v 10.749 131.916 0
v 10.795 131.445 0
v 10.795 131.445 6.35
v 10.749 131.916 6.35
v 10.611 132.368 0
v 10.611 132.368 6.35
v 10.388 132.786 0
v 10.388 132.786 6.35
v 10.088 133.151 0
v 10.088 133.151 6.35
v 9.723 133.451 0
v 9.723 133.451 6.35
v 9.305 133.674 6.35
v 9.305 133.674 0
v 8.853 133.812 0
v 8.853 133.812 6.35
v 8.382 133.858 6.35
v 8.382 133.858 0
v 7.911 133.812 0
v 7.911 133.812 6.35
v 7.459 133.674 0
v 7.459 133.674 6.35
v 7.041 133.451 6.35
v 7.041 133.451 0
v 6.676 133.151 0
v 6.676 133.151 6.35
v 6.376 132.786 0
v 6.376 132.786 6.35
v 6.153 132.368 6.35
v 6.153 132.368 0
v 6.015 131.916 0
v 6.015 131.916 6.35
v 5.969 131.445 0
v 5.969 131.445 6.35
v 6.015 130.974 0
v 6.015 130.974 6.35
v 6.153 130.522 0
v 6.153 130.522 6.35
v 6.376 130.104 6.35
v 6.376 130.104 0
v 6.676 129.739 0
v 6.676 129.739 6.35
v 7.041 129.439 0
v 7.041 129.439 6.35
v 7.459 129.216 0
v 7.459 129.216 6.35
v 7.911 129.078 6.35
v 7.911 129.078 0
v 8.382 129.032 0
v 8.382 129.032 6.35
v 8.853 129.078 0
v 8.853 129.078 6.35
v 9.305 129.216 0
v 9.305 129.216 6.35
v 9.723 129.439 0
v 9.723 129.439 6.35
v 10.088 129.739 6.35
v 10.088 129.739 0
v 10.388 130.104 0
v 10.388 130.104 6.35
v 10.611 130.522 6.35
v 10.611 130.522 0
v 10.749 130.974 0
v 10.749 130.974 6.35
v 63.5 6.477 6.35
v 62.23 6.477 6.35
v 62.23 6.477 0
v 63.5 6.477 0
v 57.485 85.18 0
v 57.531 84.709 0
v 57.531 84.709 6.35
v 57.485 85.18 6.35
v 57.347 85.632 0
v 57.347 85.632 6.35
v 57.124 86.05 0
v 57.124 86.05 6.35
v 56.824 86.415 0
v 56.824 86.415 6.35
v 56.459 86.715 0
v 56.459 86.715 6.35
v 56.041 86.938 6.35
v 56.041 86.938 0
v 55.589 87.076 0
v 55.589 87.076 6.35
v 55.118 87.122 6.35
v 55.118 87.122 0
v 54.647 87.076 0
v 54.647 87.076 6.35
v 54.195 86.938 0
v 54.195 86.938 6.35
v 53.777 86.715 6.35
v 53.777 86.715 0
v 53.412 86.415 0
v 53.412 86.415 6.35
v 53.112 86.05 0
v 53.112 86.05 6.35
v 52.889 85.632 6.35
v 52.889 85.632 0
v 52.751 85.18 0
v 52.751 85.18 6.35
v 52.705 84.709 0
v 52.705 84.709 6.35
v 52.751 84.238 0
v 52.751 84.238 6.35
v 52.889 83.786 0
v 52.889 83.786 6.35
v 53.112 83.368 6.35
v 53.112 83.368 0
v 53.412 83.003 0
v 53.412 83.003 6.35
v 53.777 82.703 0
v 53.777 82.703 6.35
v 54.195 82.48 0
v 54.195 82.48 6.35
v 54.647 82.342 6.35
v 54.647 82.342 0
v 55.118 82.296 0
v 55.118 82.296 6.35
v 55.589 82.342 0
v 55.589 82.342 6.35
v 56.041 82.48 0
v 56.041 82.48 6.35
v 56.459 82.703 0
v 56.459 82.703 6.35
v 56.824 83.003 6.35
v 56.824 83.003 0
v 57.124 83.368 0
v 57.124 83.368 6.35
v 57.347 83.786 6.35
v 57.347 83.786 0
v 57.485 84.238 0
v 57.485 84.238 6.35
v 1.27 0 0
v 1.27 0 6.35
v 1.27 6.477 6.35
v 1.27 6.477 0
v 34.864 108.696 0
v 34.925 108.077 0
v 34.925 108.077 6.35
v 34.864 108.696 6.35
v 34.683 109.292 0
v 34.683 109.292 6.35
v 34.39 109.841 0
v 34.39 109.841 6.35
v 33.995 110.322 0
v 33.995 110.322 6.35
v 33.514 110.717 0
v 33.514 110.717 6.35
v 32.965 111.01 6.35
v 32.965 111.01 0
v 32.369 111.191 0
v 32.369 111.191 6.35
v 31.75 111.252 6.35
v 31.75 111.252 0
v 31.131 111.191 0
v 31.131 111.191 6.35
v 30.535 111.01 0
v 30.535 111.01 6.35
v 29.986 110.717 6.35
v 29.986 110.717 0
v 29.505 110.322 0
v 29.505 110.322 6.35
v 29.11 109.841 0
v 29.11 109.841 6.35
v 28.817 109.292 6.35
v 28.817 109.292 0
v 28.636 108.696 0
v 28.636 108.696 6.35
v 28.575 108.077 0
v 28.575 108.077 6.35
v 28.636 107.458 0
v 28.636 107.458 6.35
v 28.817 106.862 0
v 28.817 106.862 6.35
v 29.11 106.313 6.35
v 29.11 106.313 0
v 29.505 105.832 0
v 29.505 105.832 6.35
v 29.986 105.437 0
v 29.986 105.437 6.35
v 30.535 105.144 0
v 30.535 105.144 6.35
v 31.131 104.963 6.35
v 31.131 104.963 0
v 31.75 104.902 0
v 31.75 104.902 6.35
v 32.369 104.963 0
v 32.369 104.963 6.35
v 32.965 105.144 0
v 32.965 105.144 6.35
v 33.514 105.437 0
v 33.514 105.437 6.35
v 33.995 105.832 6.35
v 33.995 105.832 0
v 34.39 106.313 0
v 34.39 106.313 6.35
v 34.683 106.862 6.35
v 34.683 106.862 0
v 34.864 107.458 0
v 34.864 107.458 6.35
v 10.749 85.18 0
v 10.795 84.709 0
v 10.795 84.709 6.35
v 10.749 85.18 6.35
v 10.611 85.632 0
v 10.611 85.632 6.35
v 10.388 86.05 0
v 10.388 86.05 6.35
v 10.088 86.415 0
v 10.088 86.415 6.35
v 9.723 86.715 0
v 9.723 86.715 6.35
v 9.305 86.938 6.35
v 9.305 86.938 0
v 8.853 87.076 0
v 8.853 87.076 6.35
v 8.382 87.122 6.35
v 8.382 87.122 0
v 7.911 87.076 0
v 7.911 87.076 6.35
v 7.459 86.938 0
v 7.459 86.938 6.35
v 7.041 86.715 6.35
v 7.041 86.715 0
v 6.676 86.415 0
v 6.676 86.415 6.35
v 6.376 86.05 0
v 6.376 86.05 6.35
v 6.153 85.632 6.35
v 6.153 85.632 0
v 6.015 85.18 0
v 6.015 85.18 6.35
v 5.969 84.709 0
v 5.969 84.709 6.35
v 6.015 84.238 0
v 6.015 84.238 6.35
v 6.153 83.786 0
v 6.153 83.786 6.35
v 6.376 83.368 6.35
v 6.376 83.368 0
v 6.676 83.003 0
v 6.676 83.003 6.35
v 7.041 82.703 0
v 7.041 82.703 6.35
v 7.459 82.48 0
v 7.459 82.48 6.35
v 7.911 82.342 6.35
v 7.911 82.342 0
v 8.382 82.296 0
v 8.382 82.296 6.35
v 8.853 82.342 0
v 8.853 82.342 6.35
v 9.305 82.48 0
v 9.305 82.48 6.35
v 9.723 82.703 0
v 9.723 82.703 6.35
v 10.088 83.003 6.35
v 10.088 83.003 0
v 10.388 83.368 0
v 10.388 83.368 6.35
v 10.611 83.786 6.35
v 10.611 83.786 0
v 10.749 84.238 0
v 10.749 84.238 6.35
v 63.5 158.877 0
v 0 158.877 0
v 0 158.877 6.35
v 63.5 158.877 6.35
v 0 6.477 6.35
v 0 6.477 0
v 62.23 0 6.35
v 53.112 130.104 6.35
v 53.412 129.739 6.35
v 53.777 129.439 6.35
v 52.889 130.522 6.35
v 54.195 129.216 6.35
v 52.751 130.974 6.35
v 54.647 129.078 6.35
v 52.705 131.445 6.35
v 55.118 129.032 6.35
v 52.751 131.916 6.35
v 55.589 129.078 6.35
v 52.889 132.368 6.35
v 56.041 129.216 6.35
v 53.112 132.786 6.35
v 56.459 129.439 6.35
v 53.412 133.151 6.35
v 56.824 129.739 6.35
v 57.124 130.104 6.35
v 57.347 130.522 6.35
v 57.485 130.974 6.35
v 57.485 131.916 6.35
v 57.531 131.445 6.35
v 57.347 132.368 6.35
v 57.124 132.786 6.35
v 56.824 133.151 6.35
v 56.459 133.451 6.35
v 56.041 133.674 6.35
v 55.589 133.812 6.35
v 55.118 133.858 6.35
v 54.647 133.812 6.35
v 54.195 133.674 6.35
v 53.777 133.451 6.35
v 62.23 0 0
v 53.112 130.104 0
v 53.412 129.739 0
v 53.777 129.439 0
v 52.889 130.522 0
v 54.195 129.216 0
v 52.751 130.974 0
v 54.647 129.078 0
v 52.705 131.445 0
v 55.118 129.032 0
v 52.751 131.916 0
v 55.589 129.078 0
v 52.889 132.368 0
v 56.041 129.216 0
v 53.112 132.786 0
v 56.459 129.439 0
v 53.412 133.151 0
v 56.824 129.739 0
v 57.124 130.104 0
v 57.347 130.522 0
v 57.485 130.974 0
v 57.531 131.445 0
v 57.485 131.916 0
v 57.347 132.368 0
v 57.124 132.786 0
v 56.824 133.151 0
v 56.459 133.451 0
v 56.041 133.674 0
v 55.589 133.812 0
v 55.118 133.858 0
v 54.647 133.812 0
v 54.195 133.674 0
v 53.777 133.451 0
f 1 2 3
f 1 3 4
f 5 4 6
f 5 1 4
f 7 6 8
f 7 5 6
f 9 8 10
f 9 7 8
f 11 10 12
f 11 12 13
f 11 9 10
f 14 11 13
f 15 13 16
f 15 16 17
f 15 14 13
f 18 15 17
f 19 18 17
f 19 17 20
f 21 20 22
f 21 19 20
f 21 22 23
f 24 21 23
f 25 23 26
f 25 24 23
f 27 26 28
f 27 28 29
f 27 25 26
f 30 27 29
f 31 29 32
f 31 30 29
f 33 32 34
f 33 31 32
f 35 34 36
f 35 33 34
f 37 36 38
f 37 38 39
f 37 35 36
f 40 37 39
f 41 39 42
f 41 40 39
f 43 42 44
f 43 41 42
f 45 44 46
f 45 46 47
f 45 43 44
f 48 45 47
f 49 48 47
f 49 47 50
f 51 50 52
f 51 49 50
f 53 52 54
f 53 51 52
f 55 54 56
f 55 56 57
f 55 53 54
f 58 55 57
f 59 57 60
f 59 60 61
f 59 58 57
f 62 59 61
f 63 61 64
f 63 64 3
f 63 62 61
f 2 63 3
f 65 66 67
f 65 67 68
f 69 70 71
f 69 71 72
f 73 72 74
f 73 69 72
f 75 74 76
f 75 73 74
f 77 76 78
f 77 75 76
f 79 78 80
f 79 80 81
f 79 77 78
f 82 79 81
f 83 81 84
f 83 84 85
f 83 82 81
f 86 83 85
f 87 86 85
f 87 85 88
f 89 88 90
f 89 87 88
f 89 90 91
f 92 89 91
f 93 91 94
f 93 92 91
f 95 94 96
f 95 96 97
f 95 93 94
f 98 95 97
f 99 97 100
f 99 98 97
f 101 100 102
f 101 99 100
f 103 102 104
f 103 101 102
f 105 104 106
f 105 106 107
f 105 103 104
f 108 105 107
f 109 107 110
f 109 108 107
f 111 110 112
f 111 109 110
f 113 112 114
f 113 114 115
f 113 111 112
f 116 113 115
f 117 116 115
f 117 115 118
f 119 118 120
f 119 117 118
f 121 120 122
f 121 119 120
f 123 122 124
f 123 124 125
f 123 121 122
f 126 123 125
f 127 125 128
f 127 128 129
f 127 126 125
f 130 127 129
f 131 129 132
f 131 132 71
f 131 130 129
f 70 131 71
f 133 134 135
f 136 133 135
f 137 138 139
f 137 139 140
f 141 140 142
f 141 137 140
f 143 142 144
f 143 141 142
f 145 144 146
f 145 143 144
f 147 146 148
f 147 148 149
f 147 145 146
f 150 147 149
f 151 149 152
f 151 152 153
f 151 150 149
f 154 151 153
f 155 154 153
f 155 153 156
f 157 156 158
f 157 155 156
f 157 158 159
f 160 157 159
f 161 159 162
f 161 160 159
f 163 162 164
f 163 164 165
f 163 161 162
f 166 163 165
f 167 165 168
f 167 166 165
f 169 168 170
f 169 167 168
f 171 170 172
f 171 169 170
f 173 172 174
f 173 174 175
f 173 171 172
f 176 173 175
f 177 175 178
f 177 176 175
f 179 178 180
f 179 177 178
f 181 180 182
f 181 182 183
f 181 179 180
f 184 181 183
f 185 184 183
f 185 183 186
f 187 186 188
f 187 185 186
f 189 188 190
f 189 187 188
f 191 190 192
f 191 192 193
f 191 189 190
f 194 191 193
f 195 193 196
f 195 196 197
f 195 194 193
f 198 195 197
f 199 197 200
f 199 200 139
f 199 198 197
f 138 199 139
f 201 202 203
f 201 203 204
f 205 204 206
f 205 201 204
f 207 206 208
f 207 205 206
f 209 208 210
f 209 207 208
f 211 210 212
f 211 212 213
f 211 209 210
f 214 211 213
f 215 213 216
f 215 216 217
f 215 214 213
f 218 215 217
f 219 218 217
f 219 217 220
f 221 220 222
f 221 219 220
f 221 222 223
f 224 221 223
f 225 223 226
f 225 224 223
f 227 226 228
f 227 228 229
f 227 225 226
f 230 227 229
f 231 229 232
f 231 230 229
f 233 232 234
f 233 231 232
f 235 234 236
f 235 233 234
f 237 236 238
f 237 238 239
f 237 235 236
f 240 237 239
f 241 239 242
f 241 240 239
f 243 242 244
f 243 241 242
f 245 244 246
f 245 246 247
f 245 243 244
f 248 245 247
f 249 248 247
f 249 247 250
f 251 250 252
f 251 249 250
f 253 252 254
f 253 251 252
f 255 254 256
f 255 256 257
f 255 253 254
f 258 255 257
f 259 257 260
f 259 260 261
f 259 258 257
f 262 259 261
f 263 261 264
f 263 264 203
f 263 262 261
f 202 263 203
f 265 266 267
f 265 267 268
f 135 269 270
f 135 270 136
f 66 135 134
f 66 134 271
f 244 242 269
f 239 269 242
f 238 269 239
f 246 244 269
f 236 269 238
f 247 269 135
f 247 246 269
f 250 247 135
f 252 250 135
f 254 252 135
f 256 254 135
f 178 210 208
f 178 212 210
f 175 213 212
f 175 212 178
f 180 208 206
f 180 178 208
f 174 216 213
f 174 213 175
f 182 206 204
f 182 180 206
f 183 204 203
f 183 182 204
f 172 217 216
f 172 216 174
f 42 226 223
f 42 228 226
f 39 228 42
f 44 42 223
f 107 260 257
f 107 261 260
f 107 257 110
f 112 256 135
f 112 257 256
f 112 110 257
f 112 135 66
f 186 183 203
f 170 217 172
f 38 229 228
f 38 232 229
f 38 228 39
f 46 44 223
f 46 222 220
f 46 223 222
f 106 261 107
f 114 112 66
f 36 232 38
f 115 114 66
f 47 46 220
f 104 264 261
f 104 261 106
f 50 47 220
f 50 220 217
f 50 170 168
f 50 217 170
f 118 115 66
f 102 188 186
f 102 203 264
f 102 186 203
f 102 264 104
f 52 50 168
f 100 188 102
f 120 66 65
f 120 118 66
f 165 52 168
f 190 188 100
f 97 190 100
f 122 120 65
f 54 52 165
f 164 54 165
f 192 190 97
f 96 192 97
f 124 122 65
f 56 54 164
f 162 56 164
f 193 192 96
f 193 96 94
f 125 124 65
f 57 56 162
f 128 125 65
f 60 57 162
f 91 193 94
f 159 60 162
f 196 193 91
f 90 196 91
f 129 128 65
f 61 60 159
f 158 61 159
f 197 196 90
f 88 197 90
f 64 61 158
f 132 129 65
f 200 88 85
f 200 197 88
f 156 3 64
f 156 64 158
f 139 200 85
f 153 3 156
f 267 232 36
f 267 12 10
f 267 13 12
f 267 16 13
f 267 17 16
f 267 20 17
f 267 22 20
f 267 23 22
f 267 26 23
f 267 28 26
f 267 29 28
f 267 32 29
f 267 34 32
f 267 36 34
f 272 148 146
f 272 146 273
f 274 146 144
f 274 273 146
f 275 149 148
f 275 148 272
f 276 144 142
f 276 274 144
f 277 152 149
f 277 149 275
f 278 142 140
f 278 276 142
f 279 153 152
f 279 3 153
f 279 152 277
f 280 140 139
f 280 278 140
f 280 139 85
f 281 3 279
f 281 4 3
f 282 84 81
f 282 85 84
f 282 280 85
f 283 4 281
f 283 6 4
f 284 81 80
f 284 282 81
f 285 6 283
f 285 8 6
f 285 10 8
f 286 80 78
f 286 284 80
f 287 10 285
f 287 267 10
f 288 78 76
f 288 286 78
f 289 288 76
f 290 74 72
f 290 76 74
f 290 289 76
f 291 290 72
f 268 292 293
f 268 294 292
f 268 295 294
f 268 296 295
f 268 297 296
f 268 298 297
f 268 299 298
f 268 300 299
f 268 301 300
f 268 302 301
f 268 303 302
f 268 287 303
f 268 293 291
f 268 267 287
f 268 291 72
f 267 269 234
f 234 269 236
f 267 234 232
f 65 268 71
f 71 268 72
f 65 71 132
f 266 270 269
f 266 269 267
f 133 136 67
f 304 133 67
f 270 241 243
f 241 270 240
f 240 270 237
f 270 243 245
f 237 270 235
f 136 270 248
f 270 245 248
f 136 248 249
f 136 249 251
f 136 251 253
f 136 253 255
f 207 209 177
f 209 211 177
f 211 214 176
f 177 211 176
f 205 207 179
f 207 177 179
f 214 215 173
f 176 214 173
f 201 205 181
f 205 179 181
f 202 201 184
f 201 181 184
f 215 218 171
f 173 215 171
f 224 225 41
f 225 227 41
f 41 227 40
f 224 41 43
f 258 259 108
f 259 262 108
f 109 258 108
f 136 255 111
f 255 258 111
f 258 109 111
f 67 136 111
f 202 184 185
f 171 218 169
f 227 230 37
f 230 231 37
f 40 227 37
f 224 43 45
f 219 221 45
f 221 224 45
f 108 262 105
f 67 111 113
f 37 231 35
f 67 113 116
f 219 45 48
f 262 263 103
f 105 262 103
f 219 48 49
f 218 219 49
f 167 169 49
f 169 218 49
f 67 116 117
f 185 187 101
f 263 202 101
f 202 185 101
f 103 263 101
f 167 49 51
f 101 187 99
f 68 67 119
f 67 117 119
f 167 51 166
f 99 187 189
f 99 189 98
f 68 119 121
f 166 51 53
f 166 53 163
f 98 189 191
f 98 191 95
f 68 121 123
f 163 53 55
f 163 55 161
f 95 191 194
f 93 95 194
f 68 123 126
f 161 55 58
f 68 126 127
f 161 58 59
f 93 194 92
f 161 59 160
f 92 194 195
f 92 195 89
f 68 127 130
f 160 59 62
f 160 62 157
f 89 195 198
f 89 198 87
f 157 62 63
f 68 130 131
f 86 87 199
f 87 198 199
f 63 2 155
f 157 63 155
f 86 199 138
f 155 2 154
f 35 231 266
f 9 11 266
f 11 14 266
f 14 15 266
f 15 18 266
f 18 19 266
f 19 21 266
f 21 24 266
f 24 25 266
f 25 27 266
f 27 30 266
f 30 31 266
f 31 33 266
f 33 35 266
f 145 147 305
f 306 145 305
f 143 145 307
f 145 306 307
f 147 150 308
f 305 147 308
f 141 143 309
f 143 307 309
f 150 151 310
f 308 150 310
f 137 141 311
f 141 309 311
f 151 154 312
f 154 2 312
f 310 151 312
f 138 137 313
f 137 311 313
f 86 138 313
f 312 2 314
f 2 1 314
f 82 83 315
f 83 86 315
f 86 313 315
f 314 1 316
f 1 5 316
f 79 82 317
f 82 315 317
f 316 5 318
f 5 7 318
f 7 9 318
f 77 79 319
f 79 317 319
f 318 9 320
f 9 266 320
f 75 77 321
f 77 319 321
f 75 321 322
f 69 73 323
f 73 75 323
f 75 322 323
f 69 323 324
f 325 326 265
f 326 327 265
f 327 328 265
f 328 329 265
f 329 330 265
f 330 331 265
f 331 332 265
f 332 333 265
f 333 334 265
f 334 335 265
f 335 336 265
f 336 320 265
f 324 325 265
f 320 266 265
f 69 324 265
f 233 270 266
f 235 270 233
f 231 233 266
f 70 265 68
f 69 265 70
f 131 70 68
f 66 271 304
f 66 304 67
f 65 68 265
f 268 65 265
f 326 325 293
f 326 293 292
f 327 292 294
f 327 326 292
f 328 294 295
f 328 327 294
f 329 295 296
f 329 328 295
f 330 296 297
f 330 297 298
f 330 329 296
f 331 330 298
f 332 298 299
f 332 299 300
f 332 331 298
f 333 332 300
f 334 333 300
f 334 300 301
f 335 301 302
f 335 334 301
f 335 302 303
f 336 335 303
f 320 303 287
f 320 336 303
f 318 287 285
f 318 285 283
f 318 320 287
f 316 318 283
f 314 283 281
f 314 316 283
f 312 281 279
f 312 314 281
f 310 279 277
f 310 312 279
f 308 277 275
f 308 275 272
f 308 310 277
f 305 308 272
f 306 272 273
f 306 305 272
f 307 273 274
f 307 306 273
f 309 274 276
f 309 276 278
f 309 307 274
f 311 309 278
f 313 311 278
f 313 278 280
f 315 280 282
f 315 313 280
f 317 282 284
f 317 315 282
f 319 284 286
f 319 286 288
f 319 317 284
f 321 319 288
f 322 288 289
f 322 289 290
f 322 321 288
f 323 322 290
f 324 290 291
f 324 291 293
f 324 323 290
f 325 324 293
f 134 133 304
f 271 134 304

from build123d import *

# Parameters (mm, degrees)
SKETCH2_W           = 63.5
SKETCH2_H           = 158.877
SKETCH2_R           = 2.413
SKETCH2_R_2         = 3.175
BOSS_EXTRUDE1_DEPTH = 6.35
SKETCH3_W           = 1.27
SKETCH3_H           = 6.477
CUT_EXTRUDE1_DEPTH  = 7.35


with BuildPart() as part:
    # Sketch2 → Boss-Extrude1 (new body)
    with BuildSketch(Plane.XY):
        with Locations((31.75, 79.4385)):
            Rectangle(SKETCH2_W, SKETCH2_H)
        with Locations((8.382, 131.445)):
            Circle(SKETCH2_R, mode=Mode.SUBTRACT)
        with Locations((55.118, 131.445)):
            Circle(SKETCH2_R, mode=Mode.SUBTRACT)
        with Locations((55.118, 84.709)):
            Circle(SKETCH2_R, mode=Mode.SUBTRACT)
        with Locations((8.382, 84.709)):
            Circle(SKETCH2_R, mode=Mode.SUBTRACT)
        with Locations((31.75, 108.077)):
            Circle(SKETCH2_R_2, mode=Mode.SUBTRACT)
    extrude(amount=BOSS_EXTRUDE1_DEPTH)

    # Sketch3 → Cut-Extrude1 (cut, through all)
    with BuildSketch(Plane.XY.offset(6.35)):
        with Locations((0.635, 3.2385)):
            Rectangle(SKETCH3_W, SKETCH3_H)
        with Locations((62.865, 3.2385)):
            Rectangle(SKETCH3_W, SKETCH3_H)
    extrude(amount=-CUT_EXTRUDE1_DEPTH, mode=Mode.SUBTRACT)


solid = part.part
